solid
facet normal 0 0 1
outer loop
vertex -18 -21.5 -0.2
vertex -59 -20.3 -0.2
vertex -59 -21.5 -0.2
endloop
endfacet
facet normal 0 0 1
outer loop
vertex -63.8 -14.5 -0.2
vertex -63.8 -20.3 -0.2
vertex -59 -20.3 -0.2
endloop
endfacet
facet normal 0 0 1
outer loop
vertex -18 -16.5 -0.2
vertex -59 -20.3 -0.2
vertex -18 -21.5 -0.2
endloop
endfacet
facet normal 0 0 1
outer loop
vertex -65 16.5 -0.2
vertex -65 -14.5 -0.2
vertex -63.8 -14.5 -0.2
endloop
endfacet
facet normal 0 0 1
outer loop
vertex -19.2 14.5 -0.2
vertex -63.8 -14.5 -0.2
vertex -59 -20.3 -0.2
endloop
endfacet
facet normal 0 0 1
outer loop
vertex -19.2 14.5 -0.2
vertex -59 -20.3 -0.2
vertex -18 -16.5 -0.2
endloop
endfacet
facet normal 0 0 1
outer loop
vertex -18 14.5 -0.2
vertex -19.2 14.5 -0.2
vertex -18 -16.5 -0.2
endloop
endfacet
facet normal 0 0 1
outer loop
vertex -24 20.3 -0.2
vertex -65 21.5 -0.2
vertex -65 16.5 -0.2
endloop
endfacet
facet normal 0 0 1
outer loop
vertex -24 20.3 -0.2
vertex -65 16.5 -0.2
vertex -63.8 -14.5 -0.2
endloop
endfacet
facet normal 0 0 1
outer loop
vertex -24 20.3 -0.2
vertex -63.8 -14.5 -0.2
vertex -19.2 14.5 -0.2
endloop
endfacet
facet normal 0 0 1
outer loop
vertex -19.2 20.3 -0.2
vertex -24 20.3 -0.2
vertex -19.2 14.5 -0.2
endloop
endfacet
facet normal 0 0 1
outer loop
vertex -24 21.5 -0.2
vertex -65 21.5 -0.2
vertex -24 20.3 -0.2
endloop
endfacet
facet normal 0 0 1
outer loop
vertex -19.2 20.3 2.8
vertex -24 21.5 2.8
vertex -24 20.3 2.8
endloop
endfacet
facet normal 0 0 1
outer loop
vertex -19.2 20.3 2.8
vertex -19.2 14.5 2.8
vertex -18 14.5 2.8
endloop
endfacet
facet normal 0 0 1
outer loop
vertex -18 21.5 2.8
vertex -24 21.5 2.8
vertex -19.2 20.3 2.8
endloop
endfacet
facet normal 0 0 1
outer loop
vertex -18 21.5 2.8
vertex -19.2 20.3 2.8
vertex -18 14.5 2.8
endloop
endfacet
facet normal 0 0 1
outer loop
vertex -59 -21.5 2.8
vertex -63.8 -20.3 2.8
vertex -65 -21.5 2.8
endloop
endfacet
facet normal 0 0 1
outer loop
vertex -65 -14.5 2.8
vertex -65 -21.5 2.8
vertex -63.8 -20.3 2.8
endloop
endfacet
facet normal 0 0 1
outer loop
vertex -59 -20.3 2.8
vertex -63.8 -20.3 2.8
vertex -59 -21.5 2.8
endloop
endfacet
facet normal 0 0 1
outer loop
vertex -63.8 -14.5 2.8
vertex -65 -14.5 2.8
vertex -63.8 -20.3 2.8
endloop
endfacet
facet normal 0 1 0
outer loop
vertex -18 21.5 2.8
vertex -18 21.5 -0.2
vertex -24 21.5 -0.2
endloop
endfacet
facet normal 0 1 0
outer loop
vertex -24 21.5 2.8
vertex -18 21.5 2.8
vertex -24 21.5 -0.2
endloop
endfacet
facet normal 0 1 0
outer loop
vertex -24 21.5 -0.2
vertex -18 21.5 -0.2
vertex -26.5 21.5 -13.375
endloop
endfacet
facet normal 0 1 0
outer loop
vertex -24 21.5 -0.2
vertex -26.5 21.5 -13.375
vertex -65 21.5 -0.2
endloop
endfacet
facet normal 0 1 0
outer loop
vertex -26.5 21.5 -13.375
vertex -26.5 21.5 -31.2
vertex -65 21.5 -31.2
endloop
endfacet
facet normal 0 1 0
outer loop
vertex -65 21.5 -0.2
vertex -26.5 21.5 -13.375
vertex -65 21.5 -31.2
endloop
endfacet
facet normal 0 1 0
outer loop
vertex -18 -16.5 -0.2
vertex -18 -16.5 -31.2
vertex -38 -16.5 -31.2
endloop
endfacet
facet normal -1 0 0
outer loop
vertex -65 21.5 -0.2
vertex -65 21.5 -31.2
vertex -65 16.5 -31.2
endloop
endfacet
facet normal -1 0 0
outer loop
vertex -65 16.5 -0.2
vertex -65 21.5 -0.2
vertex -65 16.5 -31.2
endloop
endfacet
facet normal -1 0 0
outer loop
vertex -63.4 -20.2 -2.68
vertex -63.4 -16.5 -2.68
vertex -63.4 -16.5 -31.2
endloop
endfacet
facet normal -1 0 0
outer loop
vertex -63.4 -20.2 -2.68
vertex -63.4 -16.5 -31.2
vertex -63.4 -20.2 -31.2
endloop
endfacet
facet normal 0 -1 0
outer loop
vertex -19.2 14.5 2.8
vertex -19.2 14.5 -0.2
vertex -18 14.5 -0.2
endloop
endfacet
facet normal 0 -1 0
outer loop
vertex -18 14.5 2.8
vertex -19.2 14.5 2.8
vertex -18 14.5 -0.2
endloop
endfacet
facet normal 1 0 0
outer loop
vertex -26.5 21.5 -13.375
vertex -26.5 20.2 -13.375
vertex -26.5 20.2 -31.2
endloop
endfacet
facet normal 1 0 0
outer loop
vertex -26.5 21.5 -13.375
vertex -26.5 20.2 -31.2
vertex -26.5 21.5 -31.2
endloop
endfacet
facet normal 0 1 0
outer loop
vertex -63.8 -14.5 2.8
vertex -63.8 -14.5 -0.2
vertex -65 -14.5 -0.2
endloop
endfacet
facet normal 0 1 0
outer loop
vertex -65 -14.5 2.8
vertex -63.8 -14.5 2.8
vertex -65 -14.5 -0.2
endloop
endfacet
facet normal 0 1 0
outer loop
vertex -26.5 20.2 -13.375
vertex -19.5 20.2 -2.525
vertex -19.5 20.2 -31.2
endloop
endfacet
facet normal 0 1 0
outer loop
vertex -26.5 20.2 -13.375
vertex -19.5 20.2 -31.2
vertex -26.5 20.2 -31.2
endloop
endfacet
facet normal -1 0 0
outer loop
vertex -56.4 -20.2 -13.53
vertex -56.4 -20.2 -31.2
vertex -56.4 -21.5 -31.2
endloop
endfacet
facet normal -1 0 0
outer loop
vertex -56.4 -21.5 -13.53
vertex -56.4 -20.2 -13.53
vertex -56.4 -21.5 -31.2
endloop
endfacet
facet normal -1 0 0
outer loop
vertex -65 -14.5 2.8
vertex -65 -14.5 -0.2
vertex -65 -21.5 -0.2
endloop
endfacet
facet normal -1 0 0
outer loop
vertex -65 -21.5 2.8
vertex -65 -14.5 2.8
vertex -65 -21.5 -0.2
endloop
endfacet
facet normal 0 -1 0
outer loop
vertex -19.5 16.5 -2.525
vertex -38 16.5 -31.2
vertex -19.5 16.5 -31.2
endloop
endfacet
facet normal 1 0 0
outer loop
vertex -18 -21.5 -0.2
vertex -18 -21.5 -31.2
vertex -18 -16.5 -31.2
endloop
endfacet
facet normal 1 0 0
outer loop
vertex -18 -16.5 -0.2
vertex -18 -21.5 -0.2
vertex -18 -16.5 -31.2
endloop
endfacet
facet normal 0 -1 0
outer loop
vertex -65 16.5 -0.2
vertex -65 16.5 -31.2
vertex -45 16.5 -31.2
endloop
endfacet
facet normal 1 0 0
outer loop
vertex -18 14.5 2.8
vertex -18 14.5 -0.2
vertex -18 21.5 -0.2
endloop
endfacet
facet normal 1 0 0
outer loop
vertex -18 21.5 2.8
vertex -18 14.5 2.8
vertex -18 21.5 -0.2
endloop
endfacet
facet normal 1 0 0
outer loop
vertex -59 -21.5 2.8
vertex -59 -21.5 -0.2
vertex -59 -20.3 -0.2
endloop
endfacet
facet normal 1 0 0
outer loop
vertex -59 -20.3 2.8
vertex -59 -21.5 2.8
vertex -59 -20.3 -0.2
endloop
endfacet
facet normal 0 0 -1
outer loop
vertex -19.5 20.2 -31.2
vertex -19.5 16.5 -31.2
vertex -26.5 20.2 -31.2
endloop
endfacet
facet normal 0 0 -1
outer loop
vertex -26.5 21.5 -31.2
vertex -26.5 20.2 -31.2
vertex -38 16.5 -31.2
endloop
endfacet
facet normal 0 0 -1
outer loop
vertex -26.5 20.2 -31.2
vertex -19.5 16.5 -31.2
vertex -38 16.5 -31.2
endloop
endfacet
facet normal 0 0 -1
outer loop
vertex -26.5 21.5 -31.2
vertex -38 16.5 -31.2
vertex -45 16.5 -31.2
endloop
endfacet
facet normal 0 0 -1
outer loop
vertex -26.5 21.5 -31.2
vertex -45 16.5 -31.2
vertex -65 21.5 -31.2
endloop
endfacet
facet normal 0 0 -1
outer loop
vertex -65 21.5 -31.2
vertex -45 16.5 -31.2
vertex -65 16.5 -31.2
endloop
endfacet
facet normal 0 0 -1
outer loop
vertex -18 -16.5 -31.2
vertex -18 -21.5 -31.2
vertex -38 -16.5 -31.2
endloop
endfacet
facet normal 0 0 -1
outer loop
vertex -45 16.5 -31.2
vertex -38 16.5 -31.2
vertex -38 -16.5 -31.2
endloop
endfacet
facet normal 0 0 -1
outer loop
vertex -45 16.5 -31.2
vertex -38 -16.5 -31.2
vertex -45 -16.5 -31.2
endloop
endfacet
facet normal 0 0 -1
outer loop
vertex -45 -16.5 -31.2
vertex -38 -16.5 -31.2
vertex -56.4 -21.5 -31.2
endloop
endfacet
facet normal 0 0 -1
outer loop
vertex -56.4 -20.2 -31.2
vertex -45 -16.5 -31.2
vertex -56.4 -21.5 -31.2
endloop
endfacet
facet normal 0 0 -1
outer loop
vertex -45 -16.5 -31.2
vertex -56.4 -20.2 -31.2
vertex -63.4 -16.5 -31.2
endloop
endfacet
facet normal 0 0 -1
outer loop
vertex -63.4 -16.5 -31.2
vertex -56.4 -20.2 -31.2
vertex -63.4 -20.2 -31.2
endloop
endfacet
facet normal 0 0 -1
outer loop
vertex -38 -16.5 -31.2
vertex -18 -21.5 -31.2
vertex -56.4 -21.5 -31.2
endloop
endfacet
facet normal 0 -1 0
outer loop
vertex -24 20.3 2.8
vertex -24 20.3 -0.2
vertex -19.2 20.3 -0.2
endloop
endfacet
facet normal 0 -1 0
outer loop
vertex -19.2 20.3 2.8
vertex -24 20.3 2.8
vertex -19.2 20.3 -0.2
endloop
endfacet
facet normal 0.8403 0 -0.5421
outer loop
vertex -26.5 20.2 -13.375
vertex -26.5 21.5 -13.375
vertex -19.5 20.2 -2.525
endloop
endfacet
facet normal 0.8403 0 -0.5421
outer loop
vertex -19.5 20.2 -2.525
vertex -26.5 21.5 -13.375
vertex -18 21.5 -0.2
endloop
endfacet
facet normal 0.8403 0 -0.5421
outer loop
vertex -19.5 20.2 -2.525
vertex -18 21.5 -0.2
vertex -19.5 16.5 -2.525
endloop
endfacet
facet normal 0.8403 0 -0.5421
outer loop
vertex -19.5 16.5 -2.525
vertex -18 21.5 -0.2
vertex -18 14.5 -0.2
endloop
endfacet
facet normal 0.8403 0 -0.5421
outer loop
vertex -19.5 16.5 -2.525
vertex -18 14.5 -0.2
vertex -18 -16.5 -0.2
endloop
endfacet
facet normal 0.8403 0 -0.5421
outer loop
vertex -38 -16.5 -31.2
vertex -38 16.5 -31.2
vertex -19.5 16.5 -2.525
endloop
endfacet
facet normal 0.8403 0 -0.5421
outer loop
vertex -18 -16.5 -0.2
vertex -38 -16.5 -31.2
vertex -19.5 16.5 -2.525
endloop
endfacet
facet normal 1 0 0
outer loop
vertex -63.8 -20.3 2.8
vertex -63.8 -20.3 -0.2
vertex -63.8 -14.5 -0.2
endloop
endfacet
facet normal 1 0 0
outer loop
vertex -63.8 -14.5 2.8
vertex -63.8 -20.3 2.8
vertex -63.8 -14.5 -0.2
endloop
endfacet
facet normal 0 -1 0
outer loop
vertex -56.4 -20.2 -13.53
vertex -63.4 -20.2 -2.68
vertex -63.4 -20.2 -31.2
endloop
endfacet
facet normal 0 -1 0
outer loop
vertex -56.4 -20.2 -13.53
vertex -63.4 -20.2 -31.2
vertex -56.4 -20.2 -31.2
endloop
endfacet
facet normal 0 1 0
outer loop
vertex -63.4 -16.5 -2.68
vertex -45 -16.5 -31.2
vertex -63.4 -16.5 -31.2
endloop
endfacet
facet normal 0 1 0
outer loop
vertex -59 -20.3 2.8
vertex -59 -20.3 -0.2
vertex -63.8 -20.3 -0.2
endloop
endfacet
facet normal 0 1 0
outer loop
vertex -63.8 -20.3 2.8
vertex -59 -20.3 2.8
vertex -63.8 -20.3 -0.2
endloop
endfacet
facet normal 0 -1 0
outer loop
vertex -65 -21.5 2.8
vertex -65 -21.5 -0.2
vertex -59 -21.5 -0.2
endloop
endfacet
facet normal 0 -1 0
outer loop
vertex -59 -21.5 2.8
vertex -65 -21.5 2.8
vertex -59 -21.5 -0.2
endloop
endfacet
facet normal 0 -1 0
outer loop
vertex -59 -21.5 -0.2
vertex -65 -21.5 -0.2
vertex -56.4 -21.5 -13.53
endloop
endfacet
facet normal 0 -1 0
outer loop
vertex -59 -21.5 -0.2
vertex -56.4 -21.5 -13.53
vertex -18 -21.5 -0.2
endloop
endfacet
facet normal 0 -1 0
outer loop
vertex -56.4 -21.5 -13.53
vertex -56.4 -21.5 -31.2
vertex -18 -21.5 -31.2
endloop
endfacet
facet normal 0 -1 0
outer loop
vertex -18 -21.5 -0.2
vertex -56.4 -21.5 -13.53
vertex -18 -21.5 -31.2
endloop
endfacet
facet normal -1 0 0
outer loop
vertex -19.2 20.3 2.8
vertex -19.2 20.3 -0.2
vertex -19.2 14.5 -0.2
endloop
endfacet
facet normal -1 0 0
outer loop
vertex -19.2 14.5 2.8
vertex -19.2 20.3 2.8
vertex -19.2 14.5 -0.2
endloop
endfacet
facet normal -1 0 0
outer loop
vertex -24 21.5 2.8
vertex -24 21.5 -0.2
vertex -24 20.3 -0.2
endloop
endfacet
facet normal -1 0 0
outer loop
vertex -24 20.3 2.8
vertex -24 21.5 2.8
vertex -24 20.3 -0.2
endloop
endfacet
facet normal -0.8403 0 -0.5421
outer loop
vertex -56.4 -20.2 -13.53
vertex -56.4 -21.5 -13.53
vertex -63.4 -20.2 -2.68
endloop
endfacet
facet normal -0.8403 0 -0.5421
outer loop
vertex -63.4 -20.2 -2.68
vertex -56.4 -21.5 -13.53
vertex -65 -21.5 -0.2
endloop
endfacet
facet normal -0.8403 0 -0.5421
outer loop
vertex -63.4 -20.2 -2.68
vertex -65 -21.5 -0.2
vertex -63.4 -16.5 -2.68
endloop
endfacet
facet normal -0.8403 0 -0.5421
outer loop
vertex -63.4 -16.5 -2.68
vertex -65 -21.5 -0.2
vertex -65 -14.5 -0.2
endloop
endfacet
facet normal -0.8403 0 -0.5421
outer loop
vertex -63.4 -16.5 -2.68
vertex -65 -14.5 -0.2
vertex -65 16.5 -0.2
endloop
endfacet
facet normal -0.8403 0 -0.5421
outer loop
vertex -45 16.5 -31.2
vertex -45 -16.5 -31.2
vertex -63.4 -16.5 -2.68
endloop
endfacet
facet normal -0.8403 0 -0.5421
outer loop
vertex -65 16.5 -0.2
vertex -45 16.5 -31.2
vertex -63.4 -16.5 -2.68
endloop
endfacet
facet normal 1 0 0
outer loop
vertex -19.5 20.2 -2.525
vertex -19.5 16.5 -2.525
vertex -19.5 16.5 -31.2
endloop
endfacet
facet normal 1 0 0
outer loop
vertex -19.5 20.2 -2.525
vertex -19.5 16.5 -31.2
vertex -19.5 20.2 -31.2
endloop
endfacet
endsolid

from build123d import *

# Parameters (mm, degrees)
SKETCH031_W  = 7
SKETCH031_H  = 43
SKETCH029_W  = 47
SKETCH029_H  = 43
PAD006_DEPTH = 31
PAD007_DEPTH = 3
PAD013_DEPTH = 3


with BuildPart() as part:
    # Sketch031 → AdditiveLoft001 section 0
    with BuildSketch(Plane(origin=(0, 0, -31.2), x_dir=(1, 0, 0), z_dir=(0, 0, -1))):
        with Locations((-41.5, 0)):
            Rectangle(SKETCH031_W, SKETCH031_H)
    # Sketch029 → AdditiveLoft001 section 1
    with BuildSketch(Plane.XY.offset(-0.2)):
        with Locations((-41.5, 0)):
            Rectangle(SKETCH029_W, SKETCH029_H)
    loft()

    # Sketch027 → Pad006 (new body)
    with BuildSketch(Plane(origin=(0, 0, -31.2), x_dir=(1, 0, 0), z_dir=(0, 0, -1))):
        Polygon((-18, 16.5), (-38, 16.5), (-38, -16.5), (-19.5, -16.5), (-19.5, -20.2), (-26.5, -20.2), (-26.5, -21.5), (-65, -21.5), (-65, -16.5), (-45, -16.5), (-45, 16.5), (-63.4, 16.5), (-63.4, 20.2), (-56.4, 20.2), (-56.4, 21.5), (-18, 21.5), align=None)
    extrude(amount=-PAD006_DEPTH)

    # Sketch035 → Pad007 (join)
    with BuildSketch(Plane.XY.offset(-0.2)):
        Polygon((-24, 21.5), (-24, 20.3), (-19.2, 20.3), (-19.2, 14.5), (-18, 14.5), (-18, 21.5), align=None)
    extrude(amount=PAD007_DEPTH)

    # Sketch032 (on Face11 of Pad007) → Pad013 (join)
    with BuildSketch(Plane.XY.offset(-0.2)):
        Polygon((-65, -14.5), (-65, -21.5), (-59, -21.5), (-59, -20.3), (-63.8, -20.3), (-63.8, -14.5), align=None)
    extrude(amount=PAD013_DEPTH)


solid = part.part
